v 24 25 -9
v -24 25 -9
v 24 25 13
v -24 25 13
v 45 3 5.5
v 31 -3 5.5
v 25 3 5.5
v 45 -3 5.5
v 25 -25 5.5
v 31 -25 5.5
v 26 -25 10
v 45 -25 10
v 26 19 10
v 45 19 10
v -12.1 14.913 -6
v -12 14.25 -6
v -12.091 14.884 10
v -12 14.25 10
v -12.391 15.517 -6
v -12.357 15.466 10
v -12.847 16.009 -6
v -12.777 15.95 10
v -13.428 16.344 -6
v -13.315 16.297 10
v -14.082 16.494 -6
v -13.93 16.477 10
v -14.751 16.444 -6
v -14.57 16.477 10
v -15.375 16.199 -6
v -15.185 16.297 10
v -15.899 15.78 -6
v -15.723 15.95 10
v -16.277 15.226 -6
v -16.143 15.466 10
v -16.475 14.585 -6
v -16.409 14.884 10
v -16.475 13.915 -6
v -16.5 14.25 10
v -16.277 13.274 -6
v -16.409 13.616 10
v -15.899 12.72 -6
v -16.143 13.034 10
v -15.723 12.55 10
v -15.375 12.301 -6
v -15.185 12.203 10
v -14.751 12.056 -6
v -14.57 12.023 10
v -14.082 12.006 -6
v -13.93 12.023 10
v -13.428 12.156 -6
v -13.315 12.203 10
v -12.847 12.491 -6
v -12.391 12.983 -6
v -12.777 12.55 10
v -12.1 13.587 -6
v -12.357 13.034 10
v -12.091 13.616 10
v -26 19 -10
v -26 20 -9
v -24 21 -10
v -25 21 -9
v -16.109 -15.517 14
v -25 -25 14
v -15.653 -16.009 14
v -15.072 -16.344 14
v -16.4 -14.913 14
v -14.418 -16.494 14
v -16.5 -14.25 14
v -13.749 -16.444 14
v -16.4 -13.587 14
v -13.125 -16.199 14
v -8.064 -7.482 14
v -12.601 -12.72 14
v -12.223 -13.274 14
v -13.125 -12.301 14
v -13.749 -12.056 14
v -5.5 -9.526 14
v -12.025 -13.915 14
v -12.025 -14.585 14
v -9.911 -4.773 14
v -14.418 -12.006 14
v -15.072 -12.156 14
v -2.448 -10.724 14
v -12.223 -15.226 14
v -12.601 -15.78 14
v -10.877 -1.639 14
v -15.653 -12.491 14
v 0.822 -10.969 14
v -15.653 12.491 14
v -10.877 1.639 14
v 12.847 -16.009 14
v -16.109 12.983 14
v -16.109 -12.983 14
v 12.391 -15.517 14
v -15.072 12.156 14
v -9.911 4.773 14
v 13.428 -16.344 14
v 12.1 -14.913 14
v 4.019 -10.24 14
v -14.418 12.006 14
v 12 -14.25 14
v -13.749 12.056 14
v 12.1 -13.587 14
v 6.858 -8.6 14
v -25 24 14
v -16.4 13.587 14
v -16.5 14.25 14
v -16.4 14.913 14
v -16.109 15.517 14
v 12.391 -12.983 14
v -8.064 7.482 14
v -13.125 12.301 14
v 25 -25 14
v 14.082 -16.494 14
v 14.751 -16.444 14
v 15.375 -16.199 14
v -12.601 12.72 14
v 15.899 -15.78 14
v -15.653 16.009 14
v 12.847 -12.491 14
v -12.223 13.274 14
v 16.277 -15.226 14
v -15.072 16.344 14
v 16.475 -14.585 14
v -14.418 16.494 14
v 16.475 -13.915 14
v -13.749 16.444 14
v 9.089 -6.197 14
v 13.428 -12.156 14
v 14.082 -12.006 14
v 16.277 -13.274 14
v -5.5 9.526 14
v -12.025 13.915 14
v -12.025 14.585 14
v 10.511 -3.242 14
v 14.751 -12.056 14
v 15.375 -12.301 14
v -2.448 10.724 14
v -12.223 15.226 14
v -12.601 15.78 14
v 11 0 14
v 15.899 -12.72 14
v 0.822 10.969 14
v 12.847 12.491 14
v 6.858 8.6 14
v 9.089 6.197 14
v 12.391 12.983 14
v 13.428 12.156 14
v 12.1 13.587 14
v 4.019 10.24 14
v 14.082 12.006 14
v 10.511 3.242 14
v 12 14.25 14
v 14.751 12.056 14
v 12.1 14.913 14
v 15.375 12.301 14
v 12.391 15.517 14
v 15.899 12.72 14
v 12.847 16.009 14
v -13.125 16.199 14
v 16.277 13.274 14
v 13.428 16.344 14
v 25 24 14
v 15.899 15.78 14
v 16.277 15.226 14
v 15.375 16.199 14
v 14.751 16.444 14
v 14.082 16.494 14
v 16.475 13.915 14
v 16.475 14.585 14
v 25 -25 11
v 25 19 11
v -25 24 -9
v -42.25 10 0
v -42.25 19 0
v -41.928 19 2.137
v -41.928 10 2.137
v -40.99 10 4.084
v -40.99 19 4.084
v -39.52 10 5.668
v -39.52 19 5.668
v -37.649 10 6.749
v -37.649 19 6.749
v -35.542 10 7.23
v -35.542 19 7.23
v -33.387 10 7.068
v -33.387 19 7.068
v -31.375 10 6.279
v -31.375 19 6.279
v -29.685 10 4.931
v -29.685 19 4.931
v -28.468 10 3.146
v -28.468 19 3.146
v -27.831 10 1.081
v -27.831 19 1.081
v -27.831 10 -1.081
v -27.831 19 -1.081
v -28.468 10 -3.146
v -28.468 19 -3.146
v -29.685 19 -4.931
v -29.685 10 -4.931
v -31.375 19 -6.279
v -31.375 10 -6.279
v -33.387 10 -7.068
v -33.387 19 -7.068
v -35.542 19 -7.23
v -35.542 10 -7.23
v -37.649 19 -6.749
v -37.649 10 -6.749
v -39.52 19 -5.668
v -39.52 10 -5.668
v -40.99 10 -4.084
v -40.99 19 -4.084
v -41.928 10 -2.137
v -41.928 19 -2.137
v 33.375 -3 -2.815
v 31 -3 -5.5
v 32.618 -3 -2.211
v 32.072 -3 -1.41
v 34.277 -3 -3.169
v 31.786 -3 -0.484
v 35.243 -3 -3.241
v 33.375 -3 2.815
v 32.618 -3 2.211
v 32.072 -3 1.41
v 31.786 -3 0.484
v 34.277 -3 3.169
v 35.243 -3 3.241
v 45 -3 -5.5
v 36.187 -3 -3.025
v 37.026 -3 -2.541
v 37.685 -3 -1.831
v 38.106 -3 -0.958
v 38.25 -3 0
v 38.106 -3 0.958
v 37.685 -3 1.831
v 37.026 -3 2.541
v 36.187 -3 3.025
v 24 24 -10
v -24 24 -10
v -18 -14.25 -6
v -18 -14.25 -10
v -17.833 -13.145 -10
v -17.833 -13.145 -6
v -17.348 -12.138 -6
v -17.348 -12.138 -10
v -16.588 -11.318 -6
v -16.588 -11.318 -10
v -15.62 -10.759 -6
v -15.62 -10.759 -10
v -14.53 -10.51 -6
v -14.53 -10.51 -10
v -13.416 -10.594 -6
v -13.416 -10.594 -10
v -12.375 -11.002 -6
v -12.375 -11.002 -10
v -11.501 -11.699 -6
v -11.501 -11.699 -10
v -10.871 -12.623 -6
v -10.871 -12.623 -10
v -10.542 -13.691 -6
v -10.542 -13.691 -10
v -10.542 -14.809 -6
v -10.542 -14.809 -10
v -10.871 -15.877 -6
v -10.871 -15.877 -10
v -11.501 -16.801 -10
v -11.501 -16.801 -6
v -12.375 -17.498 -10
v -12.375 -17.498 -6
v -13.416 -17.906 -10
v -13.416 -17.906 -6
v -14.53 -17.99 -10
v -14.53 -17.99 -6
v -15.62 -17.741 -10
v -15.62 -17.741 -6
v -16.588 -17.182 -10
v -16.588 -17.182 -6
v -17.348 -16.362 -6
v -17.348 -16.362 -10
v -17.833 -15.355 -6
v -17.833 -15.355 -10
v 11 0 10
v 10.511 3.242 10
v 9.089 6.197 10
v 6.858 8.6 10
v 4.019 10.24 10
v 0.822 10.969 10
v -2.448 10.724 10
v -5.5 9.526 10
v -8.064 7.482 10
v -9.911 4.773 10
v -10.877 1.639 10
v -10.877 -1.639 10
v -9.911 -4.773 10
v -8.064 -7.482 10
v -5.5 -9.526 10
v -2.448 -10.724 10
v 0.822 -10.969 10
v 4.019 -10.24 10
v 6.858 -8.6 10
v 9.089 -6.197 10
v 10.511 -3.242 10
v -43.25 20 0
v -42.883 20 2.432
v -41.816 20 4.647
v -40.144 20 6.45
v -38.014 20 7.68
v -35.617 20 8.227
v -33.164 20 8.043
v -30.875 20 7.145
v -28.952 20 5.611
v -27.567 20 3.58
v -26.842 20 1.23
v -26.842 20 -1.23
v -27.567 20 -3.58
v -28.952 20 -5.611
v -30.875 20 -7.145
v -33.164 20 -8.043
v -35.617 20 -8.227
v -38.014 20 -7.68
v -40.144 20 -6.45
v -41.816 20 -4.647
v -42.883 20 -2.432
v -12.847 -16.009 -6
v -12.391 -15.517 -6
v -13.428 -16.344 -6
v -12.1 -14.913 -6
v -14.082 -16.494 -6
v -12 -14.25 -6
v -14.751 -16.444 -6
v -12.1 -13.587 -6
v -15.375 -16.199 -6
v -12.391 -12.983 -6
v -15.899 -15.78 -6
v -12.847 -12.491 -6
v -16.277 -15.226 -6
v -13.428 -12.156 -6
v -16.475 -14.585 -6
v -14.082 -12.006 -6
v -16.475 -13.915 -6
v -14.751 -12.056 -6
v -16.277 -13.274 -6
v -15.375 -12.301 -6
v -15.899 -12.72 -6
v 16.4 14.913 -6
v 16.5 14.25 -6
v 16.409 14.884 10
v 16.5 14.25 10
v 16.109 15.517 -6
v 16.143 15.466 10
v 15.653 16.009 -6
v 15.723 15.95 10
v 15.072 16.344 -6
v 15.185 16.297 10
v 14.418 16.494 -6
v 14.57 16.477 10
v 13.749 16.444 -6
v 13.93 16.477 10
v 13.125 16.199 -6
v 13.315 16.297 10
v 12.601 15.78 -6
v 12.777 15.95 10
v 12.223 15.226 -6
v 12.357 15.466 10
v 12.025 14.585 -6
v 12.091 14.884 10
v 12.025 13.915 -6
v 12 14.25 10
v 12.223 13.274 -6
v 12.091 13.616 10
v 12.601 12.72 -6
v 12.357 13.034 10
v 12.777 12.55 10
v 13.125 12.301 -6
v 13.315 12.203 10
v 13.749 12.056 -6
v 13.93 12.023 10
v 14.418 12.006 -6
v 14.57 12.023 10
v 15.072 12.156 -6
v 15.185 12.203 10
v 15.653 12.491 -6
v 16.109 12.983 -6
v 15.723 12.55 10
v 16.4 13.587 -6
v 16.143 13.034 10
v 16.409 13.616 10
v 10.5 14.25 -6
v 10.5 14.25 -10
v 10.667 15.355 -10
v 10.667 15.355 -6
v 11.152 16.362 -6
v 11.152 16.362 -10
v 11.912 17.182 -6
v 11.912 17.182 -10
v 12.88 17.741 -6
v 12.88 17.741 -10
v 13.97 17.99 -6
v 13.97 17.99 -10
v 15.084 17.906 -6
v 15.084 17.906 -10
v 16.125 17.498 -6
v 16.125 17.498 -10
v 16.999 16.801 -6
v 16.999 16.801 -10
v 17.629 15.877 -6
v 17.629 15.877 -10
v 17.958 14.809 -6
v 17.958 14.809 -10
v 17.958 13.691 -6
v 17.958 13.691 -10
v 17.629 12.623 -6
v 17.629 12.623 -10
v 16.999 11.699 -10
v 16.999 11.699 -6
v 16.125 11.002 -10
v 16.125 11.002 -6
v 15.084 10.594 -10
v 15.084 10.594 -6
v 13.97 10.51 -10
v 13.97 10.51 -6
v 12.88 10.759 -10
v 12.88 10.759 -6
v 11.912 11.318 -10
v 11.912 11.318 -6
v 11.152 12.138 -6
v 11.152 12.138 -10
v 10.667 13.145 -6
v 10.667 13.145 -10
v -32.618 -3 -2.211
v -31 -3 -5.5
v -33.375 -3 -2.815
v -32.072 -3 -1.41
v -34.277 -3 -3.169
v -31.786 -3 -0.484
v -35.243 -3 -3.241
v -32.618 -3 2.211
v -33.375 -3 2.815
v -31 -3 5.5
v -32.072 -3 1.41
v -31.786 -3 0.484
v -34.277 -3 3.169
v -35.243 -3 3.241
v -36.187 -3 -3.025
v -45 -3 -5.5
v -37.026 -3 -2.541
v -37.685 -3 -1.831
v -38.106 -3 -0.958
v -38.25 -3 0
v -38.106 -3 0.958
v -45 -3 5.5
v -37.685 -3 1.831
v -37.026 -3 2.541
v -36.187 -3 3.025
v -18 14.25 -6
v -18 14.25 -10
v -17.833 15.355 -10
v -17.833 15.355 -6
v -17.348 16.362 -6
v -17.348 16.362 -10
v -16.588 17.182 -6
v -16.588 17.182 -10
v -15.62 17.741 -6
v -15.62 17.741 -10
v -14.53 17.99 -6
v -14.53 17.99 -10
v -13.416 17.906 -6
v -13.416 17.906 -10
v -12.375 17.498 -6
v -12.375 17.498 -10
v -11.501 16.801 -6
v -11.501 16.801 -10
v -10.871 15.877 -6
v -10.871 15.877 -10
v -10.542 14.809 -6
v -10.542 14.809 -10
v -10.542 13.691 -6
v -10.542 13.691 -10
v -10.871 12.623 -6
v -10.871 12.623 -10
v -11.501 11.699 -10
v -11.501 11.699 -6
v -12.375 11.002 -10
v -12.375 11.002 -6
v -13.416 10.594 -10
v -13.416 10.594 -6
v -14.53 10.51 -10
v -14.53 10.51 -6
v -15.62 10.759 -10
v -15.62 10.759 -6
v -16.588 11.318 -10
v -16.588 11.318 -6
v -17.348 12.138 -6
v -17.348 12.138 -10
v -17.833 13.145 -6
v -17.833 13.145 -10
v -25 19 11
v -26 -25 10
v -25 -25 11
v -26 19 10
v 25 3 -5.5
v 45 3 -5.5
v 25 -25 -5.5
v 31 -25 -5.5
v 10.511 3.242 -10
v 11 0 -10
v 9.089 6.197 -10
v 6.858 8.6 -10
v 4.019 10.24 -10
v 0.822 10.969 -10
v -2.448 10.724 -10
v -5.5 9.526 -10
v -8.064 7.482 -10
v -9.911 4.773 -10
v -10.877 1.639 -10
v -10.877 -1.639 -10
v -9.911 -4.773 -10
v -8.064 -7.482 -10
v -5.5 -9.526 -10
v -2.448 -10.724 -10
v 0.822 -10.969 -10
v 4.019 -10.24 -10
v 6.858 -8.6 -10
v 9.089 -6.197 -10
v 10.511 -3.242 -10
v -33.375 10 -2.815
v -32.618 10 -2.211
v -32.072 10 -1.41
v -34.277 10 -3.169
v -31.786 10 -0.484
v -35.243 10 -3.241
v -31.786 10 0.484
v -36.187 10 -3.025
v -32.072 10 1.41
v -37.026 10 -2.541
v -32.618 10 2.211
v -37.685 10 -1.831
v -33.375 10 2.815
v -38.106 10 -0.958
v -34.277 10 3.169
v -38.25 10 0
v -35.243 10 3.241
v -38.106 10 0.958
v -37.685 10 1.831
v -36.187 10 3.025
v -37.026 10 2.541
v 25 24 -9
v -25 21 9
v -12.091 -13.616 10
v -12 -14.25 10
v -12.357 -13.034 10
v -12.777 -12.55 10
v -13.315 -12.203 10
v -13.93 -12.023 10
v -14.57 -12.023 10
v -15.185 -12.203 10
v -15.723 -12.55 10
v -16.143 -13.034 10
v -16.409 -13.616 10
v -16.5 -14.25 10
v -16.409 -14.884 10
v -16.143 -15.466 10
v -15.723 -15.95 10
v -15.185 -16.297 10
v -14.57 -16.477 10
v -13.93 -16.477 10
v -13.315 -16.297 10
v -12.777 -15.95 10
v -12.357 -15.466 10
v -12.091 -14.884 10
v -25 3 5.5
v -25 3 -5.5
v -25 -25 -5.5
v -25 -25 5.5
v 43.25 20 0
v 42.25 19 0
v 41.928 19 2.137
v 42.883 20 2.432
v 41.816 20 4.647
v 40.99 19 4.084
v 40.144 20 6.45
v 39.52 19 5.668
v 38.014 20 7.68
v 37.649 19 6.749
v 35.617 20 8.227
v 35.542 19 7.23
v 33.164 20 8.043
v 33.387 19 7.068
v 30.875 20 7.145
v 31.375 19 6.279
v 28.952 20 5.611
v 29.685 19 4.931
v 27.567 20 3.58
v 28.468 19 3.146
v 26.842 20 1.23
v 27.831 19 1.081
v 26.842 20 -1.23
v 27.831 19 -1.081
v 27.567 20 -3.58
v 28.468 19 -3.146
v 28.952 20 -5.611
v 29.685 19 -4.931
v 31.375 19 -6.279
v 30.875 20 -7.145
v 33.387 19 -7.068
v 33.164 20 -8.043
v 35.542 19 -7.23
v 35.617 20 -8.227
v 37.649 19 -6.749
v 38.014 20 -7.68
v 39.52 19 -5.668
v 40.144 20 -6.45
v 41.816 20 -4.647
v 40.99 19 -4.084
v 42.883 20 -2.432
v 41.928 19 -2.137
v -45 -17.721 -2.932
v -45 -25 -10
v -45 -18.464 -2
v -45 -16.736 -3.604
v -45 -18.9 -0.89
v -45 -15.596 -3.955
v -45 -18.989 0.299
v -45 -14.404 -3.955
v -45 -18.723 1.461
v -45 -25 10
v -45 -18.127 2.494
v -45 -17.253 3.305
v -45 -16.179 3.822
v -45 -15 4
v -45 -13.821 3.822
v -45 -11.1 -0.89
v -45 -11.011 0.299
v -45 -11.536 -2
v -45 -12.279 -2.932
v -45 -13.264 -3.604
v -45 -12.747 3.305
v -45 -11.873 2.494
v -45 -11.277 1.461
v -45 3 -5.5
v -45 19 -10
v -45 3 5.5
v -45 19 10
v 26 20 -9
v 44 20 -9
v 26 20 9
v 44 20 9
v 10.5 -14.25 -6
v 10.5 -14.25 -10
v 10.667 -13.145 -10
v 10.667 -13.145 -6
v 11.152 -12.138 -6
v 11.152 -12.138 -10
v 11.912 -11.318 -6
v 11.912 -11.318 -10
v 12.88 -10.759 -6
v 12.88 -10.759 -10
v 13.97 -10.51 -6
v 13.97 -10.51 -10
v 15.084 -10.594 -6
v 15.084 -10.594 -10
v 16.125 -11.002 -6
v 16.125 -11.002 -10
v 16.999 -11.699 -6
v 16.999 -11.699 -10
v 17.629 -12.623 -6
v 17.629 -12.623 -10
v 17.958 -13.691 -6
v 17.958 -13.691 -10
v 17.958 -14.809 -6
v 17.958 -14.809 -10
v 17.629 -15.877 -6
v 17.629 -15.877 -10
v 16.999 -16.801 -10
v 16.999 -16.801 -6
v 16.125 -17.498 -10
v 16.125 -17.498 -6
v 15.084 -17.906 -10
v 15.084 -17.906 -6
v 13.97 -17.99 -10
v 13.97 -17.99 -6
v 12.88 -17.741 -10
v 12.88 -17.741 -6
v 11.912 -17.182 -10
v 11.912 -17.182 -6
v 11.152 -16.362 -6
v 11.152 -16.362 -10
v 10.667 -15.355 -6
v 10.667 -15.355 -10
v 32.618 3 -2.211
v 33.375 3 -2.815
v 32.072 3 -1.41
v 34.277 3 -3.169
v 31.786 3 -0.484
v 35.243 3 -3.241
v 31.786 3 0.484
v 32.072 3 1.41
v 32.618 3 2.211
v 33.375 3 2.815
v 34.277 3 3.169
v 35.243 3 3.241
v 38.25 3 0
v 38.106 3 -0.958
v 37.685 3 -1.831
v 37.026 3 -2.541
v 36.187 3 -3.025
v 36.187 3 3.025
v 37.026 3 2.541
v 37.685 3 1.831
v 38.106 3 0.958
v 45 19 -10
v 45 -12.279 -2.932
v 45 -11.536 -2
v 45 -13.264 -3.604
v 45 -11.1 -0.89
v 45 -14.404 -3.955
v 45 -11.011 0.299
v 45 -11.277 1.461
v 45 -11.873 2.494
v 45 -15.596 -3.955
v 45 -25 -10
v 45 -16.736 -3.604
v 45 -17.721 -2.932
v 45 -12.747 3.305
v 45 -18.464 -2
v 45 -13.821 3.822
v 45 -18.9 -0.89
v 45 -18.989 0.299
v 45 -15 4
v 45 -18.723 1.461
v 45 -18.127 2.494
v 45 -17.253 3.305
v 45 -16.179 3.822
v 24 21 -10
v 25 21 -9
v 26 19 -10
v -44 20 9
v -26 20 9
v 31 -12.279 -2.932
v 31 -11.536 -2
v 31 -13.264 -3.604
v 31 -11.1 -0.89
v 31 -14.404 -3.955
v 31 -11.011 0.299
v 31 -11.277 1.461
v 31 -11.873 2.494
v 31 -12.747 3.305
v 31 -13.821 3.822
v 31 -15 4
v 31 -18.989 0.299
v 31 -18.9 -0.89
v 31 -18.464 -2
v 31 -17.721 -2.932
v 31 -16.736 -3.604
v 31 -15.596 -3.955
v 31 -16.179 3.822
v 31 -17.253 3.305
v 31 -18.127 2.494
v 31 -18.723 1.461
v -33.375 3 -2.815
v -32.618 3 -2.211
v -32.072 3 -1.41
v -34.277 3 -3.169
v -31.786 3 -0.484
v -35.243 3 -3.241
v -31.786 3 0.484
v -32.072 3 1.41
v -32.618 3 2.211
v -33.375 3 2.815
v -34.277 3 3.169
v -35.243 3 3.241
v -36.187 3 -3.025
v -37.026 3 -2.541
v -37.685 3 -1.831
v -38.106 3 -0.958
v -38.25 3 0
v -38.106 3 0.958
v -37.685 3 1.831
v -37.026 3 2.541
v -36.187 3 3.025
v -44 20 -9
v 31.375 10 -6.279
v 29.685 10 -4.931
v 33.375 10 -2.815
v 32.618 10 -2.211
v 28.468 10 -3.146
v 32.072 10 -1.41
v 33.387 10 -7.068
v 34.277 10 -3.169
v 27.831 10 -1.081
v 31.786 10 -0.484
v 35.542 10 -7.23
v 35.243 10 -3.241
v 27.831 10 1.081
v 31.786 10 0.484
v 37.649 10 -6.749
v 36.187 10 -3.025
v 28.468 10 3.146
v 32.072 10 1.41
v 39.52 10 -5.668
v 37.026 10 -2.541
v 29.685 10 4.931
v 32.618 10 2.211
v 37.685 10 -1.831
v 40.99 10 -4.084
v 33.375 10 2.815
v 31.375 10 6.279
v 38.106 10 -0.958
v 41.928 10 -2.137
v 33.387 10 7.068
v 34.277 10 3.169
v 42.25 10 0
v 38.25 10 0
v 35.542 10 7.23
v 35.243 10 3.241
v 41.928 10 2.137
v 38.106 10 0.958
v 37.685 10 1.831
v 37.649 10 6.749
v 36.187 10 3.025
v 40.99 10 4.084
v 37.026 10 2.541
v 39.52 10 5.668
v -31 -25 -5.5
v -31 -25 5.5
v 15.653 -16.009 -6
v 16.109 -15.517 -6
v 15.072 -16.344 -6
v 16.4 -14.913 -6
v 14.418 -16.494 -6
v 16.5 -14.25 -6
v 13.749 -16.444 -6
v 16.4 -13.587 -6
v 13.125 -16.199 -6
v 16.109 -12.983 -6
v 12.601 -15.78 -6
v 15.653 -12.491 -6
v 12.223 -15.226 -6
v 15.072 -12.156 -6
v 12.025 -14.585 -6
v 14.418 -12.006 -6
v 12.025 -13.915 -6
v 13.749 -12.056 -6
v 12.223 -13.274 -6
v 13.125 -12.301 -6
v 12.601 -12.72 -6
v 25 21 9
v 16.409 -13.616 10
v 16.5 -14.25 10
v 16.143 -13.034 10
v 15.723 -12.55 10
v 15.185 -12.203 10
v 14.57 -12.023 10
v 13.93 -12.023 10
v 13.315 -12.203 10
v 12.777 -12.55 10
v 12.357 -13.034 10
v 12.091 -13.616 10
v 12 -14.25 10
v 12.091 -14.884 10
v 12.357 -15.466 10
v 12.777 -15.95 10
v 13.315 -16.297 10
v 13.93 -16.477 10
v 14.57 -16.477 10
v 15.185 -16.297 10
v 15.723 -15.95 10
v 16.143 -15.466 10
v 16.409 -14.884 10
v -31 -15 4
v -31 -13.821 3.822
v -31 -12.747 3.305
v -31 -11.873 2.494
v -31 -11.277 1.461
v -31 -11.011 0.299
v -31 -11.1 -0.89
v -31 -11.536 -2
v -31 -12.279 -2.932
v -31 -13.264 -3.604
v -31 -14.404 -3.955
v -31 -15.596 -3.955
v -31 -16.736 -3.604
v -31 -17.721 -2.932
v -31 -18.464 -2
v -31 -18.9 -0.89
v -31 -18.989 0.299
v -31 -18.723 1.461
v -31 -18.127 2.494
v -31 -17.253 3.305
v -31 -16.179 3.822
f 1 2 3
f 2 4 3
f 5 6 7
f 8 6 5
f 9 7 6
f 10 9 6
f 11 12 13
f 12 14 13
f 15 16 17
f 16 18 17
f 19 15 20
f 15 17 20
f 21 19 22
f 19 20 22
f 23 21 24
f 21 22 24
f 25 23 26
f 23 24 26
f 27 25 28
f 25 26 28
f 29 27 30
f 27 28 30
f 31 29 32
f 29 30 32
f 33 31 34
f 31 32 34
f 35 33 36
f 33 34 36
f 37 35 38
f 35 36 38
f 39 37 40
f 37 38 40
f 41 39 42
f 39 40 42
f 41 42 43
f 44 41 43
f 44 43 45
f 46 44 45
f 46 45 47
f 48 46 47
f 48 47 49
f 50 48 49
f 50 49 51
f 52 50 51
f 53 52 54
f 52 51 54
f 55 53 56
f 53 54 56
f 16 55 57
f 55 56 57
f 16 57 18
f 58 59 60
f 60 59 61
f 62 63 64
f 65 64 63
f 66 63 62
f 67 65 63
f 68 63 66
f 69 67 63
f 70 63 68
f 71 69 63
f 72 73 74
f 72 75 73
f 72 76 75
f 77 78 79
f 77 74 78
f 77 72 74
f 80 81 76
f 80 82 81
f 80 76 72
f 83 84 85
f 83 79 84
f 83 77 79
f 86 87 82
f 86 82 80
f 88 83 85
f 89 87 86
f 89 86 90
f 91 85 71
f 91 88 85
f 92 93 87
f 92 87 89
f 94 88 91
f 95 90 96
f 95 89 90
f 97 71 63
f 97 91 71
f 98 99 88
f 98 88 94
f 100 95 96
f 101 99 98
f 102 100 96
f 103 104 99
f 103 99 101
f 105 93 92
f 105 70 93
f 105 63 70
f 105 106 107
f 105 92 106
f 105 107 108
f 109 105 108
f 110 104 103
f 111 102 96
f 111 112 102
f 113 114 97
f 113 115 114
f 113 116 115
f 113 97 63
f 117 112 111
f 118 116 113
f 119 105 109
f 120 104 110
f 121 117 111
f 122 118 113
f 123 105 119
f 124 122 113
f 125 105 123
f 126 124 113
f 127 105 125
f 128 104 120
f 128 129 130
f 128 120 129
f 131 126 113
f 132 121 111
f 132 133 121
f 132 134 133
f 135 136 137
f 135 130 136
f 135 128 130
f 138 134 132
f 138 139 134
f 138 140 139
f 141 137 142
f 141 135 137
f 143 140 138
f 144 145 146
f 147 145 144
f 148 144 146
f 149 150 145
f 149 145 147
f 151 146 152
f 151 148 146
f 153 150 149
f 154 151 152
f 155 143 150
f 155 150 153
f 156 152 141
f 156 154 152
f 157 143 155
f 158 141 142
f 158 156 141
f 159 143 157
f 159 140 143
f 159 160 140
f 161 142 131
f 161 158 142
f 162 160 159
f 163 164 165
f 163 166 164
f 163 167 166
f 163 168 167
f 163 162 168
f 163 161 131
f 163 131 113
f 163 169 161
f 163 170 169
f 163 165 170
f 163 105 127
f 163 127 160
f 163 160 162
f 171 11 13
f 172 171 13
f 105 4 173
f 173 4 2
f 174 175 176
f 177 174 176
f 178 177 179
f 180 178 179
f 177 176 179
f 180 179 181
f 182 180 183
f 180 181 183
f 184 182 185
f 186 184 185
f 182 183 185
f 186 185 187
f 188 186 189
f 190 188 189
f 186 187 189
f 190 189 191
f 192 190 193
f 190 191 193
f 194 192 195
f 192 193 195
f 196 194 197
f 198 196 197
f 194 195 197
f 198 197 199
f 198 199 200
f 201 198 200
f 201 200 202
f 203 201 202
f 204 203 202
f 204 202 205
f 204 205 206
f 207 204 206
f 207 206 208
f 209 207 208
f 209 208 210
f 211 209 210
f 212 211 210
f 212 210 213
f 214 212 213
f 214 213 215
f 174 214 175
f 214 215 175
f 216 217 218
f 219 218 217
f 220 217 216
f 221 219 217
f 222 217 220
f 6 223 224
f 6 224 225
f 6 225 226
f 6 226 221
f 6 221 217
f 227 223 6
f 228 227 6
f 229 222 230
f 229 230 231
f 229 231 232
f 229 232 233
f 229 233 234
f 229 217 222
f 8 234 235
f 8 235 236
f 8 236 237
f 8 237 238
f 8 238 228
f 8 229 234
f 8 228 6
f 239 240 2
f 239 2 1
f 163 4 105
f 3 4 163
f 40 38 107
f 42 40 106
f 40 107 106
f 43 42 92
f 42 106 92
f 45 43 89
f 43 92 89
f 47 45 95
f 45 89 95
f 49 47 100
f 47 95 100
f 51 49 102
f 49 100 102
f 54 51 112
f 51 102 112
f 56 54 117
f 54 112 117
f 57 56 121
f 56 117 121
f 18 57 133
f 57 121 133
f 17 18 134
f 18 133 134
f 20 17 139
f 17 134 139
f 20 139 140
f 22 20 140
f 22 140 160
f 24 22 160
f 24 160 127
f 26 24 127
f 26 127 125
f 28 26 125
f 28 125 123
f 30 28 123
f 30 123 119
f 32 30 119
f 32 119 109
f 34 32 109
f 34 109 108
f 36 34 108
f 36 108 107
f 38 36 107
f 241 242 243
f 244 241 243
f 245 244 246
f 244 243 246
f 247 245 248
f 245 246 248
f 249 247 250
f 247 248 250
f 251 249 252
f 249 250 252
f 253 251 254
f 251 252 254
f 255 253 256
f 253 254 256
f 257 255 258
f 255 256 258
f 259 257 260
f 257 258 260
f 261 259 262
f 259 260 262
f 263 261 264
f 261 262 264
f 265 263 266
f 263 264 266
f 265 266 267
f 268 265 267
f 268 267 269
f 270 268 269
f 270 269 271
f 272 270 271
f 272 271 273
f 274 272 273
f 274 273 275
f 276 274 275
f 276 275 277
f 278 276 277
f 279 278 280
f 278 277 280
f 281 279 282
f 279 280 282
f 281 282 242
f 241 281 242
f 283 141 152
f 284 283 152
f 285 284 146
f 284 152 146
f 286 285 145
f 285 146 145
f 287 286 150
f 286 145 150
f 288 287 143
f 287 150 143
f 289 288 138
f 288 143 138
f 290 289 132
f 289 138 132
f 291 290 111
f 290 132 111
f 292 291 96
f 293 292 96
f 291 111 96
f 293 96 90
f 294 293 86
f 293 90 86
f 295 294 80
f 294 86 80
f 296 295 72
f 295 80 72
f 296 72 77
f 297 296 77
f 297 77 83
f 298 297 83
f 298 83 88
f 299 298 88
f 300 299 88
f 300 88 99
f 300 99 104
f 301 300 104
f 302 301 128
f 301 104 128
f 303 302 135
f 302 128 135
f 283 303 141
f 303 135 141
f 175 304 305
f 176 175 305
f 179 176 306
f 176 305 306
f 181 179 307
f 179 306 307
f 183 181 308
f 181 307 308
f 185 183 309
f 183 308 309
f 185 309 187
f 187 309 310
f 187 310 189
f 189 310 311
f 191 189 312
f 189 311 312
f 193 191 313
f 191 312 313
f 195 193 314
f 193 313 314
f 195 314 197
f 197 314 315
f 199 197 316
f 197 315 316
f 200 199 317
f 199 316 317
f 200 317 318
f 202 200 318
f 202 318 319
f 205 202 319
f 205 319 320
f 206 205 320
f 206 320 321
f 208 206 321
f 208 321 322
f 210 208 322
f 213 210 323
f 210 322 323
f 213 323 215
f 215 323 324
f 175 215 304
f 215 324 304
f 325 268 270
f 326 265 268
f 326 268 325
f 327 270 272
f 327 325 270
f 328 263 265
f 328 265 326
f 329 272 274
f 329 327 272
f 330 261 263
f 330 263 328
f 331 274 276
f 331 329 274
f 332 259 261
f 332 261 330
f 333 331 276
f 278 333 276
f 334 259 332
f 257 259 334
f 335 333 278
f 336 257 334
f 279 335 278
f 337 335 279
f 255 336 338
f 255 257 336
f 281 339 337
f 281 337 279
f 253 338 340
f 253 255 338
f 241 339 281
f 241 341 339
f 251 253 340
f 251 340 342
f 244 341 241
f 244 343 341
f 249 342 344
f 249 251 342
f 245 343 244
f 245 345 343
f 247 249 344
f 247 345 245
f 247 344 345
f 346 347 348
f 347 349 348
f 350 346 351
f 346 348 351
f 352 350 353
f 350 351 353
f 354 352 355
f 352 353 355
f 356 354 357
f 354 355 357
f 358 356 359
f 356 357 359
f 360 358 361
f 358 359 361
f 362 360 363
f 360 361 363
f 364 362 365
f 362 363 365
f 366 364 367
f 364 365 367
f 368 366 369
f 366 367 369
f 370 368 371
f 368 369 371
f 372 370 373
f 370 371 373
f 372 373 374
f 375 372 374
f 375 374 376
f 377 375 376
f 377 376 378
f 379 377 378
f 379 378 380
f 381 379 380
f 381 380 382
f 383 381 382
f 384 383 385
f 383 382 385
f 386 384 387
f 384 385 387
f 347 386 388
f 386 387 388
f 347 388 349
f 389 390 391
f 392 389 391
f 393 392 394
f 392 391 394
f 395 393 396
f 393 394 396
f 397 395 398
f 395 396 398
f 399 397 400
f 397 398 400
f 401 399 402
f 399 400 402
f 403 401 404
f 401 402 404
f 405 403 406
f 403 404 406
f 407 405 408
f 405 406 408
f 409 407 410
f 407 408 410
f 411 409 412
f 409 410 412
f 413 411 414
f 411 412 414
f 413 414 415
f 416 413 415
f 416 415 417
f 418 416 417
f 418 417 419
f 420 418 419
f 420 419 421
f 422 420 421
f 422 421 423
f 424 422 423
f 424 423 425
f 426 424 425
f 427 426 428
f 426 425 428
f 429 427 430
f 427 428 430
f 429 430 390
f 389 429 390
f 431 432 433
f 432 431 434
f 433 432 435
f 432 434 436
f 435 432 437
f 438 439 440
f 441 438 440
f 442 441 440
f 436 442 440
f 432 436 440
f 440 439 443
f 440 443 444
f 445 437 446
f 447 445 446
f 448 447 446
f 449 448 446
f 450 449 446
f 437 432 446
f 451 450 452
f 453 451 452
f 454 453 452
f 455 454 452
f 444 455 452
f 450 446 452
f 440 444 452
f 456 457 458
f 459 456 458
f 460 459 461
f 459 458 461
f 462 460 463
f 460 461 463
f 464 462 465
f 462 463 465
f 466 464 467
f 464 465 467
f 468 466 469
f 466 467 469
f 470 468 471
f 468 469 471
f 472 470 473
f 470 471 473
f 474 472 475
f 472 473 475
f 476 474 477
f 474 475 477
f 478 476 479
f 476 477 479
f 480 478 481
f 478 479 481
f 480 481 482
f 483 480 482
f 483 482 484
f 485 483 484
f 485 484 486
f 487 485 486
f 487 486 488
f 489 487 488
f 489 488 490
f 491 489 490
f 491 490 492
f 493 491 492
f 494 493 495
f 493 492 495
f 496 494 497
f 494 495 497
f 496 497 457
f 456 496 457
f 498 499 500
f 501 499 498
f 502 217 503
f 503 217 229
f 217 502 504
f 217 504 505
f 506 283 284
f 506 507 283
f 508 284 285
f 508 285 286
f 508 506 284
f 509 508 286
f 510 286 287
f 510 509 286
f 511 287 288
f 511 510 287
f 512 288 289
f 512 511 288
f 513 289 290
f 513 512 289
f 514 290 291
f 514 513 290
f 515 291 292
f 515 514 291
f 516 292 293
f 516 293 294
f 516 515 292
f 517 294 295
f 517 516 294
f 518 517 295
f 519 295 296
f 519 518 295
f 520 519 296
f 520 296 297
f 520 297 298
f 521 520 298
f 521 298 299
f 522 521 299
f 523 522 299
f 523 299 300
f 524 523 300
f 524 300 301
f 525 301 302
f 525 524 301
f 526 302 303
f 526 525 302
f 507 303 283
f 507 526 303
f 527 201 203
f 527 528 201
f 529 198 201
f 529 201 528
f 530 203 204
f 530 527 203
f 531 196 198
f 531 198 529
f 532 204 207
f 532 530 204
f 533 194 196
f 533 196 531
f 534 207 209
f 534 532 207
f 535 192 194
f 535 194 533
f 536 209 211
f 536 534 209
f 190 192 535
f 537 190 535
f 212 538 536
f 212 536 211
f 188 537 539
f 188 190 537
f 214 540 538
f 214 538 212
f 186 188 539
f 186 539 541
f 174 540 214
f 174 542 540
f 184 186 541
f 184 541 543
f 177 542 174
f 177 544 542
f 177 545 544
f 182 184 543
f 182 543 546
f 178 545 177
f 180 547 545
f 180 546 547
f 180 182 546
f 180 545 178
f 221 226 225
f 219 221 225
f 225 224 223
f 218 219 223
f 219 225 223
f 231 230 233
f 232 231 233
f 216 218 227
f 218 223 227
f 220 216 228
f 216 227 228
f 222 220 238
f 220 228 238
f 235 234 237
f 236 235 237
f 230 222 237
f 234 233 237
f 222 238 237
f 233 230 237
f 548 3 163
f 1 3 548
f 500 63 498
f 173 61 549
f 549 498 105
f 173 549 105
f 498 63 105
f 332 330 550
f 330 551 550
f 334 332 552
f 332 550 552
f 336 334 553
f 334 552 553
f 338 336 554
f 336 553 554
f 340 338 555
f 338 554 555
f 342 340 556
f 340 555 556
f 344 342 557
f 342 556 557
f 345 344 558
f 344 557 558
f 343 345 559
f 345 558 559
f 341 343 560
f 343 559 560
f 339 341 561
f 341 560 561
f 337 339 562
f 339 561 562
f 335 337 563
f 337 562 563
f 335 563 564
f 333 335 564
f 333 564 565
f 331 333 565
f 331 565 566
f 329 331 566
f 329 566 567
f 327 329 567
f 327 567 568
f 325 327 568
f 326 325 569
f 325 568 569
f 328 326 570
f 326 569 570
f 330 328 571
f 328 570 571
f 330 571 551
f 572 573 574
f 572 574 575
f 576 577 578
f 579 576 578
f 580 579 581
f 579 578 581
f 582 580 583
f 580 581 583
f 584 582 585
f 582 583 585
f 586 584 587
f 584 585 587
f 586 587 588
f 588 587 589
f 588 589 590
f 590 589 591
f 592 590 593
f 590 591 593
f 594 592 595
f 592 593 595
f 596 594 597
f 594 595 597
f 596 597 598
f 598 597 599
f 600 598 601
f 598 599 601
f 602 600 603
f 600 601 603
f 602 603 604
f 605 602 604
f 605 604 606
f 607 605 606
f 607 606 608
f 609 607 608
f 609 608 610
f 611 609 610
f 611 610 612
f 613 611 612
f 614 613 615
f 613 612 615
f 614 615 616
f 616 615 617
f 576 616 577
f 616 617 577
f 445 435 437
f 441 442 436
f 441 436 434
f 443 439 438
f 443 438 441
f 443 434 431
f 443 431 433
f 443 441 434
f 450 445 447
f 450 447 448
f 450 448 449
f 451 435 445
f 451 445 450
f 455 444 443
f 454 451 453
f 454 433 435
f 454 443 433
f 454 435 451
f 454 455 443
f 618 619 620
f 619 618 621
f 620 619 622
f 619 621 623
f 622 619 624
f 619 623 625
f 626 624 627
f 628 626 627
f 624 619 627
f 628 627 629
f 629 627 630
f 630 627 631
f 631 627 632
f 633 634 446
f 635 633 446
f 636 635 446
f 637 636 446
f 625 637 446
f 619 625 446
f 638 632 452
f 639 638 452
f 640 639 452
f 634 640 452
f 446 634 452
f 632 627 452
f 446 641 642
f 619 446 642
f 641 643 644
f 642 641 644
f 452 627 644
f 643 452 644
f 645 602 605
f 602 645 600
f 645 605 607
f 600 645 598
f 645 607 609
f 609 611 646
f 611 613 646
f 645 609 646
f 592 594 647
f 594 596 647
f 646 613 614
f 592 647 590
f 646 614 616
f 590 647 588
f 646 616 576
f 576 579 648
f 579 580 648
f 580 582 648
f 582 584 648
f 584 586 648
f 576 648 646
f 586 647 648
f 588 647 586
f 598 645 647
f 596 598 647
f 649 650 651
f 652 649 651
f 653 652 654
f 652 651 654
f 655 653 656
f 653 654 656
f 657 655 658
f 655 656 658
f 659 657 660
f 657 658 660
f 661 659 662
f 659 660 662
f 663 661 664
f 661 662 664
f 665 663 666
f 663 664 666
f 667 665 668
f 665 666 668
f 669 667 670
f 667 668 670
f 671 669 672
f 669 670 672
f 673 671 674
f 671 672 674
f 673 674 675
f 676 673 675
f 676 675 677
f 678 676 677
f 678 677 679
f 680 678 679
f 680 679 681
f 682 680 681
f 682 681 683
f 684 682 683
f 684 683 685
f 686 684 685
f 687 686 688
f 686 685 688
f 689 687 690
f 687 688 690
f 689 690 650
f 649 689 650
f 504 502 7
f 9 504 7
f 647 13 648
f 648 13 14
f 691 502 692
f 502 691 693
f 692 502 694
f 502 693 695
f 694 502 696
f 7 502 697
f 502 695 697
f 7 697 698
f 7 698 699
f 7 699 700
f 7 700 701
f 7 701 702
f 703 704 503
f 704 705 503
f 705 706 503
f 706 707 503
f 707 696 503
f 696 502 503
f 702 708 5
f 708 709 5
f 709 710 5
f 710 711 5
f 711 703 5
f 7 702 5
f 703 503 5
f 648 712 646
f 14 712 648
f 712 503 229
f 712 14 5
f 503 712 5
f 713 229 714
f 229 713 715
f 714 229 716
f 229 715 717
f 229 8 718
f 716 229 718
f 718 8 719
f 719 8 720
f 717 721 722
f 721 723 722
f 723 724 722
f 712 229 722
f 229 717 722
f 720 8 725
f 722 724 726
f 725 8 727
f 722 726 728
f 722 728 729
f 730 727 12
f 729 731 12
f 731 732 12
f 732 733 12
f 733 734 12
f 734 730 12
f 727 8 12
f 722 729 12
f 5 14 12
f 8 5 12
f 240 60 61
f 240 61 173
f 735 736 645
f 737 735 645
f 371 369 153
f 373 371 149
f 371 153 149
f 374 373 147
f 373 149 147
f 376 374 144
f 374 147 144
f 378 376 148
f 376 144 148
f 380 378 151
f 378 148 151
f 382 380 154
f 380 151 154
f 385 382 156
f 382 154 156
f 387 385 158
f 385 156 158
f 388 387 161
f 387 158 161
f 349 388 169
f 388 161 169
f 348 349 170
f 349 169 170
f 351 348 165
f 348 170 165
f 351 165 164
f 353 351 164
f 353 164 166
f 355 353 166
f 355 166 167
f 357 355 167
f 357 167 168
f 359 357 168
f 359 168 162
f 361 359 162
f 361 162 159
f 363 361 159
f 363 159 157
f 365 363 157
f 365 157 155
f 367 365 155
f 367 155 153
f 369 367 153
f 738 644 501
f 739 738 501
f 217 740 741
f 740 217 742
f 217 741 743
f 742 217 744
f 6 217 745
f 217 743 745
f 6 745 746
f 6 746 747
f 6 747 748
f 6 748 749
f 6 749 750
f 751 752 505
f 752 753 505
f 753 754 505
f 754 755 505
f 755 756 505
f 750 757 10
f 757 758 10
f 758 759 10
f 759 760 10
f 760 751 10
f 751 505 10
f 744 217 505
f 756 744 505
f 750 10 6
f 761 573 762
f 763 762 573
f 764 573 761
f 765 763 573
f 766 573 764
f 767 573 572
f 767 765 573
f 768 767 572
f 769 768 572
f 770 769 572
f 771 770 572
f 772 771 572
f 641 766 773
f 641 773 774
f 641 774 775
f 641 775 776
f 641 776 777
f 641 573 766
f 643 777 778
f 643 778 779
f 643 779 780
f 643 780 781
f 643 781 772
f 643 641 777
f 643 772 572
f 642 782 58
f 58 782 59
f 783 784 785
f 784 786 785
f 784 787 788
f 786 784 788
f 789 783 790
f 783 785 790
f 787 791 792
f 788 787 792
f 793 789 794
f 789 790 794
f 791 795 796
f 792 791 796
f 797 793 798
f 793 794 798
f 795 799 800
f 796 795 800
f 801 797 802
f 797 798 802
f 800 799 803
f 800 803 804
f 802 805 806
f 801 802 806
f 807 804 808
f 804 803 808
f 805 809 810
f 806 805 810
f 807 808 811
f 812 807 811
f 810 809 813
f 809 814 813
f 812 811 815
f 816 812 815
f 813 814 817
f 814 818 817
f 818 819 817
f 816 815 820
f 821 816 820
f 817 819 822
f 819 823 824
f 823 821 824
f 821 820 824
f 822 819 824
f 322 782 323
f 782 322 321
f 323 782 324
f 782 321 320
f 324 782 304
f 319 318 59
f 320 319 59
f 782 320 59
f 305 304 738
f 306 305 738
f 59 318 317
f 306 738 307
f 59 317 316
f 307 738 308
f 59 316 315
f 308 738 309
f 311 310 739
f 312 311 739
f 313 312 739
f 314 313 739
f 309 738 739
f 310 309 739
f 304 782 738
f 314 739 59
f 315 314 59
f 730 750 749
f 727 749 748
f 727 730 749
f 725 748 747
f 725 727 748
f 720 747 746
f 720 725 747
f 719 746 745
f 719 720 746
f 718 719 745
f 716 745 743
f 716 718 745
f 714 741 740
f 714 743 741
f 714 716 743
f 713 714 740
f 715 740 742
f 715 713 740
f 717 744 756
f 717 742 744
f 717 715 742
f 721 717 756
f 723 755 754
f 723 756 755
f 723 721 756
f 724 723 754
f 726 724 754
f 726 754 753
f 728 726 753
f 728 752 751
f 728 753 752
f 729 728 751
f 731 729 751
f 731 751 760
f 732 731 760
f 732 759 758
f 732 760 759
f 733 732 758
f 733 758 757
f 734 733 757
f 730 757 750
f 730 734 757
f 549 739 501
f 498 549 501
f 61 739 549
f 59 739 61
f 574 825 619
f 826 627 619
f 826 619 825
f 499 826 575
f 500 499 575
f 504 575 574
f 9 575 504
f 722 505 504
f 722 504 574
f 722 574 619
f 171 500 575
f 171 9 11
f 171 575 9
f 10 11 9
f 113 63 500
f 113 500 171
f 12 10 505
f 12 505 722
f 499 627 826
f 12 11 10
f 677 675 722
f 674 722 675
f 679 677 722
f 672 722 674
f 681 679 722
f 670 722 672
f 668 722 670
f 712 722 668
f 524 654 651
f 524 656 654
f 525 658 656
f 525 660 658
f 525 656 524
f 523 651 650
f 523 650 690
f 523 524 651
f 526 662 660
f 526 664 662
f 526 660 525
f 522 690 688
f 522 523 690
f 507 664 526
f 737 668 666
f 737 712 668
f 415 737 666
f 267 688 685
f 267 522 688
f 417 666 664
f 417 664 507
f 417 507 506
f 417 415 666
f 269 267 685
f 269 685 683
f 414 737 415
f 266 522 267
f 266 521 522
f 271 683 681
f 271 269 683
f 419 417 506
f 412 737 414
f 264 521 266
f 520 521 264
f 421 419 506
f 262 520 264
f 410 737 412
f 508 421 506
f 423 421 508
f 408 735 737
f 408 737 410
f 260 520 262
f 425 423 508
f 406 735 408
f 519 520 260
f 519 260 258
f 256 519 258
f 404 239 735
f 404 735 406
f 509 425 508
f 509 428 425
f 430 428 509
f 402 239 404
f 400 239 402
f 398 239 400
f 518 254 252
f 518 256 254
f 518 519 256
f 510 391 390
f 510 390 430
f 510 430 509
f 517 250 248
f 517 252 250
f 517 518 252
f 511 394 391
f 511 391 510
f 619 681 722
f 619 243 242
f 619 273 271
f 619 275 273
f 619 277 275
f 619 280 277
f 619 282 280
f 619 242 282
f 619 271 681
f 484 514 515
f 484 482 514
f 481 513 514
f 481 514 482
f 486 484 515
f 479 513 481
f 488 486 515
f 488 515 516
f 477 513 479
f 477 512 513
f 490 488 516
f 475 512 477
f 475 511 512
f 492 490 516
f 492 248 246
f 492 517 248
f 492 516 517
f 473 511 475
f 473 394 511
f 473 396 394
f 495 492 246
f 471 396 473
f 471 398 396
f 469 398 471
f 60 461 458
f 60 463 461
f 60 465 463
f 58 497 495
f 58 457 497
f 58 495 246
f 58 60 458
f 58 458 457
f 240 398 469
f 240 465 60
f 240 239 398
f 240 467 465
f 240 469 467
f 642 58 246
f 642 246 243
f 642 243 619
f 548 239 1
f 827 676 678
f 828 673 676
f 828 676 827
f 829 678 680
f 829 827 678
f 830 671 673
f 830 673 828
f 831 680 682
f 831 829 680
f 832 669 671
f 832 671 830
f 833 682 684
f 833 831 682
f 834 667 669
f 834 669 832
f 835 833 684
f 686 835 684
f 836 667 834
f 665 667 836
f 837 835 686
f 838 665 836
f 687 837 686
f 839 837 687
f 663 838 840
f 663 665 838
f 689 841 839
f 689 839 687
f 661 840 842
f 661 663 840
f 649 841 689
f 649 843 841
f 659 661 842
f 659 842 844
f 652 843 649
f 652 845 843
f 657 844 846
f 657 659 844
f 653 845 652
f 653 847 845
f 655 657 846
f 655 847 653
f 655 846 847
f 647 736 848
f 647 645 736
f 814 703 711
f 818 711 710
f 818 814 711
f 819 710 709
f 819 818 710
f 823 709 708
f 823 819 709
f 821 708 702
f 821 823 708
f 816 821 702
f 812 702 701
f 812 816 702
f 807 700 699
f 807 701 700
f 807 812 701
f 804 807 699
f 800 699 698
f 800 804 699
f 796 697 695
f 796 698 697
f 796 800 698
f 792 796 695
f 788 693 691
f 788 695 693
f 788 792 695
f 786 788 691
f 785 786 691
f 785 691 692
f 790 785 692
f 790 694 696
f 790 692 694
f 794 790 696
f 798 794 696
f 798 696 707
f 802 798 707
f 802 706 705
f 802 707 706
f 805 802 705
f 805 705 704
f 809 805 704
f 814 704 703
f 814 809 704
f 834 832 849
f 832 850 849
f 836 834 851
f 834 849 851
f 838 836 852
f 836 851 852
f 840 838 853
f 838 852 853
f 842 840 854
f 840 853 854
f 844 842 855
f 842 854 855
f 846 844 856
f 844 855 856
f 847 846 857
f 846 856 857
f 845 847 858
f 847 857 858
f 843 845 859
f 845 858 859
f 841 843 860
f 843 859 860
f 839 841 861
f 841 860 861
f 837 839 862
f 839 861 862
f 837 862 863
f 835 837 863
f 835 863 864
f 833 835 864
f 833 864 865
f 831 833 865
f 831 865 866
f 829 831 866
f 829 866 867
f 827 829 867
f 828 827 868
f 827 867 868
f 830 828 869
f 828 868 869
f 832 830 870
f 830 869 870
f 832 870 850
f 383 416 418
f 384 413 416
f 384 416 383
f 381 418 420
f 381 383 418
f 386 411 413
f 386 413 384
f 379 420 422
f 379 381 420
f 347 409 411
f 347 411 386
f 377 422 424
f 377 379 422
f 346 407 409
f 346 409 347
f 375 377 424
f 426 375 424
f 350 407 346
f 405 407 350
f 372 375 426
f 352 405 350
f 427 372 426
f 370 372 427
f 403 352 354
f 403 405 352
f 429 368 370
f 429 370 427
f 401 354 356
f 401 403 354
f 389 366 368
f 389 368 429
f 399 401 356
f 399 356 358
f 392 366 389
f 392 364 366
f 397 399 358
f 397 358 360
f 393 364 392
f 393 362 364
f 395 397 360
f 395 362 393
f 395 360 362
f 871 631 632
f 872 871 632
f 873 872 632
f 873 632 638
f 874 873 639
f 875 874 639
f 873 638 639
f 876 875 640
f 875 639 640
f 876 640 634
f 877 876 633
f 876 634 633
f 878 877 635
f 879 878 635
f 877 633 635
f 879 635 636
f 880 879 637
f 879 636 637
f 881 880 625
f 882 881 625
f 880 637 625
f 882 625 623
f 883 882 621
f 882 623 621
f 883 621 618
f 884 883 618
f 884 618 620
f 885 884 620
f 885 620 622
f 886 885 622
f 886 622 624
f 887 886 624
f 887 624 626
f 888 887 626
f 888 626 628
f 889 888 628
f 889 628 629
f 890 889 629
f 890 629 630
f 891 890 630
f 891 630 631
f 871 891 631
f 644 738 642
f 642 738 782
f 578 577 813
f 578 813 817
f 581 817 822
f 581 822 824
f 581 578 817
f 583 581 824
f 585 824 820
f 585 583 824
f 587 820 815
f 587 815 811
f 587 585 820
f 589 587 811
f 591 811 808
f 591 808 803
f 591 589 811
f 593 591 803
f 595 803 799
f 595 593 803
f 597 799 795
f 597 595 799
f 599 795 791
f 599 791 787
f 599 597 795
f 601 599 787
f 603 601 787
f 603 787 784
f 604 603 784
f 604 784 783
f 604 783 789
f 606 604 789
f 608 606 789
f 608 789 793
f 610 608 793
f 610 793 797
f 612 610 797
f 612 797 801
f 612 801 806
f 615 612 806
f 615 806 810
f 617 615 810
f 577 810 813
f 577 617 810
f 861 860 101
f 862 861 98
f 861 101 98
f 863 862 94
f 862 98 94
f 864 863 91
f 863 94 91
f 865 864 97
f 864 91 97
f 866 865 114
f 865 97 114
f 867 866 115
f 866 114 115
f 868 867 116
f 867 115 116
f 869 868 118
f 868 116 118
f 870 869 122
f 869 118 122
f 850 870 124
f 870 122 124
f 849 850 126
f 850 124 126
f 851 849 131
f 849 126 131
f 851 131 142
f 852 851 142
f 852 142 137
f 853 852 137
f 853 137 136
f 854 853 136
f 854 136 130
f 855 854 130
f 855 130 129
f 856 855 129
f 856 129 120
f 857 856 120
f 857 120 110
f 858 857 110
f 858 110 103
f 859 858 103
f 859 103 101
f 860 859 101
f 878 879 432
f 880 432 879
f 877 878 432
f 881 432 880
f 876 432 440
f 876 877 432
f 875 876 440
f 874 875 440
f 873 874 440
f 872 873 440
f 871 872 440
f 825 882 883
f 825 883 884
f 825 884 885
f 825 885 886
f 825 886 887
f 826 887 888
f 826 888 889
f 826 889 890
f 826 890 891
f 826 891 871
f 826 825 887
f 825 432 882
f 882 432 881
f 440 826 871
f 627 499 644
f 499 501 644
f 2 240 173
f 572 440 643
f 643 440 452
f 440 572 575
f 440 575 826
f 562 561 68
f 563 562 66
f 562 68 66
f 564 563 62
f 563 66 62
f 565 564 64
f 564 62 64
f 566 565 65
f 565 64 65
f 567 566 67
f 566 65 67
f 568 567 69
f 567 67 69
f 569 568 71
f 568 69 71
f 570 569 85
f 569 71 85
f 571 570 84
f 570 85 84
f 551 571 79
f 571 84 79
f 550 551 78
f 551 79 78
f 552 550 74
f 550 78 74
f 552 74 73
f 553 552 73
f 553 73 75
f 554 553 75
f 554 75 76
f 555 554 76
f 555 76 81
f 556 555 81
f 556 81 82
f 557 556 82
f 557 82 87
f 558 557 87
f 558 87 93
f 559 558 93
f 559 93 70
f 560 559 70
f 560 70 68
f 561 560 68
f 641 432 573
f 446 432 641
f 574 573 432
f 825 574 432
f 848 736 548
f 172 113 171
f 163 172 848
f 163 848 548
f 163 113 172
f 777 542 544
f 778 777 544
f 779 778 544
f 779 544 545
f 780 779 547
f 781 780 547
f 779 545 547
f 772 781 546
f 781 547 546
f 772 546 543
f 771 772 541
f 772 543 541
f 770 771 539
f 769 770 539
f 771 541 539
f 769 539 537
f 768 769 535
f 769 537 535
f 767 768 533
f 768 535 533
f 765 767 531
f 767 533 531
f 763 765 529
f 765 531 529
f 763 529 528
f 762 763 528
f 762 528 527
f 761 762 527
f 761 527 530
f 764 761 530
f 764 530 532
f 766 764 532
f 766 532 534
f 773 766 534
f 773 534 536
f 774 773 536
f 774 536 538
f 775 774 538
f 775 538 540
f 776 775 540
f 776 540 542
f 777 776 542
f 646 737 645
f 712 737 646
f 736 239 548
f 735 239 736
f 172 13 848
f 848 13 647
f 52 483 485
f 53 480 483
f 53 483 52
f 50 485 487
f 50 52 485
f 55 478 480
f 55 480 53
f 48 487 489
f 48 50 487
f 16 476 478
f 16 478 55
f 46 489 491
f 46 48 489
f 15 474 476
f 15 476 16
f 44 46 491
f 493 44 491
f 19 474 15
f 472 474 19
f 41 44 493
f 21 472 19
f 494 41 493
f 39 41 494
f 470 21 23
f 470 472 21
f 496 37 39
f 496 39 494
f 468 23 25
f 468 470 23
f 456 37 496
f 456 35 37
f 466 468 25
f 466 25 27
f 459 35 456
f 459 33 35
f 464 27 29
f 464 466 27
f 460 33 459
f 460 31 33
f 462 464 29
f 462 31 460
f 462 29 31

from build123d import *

# Parameters (mm, degrees)
SKETCH1_R              = 11
BODY_DEPTH             = 10
M4_CLEARANCE_HOLE1_D   = 4.5
ELEVATION_START        = 4
SKETCH10_W             = 50
SKETCH10_H             = 50
SKETCH10_R             = 2.25
SKETCH10_R_2           = 11
ELEVATION_DEPTH        = 4
SKETCH13_R             = 3.75
M4_SCREW_PLACE_DEPTH   = 4
SKETCH14_R             = 7.25
SPRING_HOLE_DEPTH      = 10
SKETCH15_W             = 11
SKETCH15_H             = 6
NUT_HOLE_DEPTH         = 20
SKETCH16_R             = 3.25
SHAFT_HOLE_DEPTH       = 13
SKETCH17_R             = 4
BRAKE_SCREW_HOLE_DEPTH = 20
SKETCH18_W             = 6
SKETCH18_H             = 11
BRAKE_NUT_HOLE_DEPTH   = 25
CHAMFER1_SIZE          = 1


with BuildPart() as part:
    # Sketch1 → Body (new, symmetric)
    with BuildSketch(Plane.XY):
        Polygon((25, -25), (-25, -25), (-45, -25), (-45, 20), (-25, 20), (-25, 25), (25, 25), (25, 20), (45, 20), (45, -25), align=None)
        Circle(SKETCH1_R, mode=Mode.SUBTRACT)
    extrude(amount=BODY_DEPTH, both=True)

    # M4 Clearance Hole1 (through all)
    with Locations(Plane(origin=(0, 0, -10), x_dir=(-1, 0, 0), z_dir=(0, 0, -1))):
        with Locations((0, 0), (-14.25, 14.25), (14.25, -14.25), (14.25, 14.25), (-14.25, -14.25)):
            Hole(M4_CLEARANCE_HOLE1_D / 2)

    # Sketch10 → Elevation (add)
    with BuildSketch(Plane.XY.offset(10).offset(ELEVATION_START)):
        Rectangle(SKETCH10_W, SKETCH10_H)
        with Locations(Location((-14.25, -14.25, 0), (0, 0, 180))):
            Circle(SKETCH10_R, mode=Mode.SUBTRACT)
        with Locations(Location((14.25, -14.25, 0), (0, 0, 180))):
            Circle(SKETCH10_R, mode=Mode.SUBTRACT)
        with Locations(Location((14.25, 14.25, 0), (0, 0, 180))):
            Circle(SKETCH10_R, mode=Mode.SUBTRACT)
        Circle(SKETCH10_R_2, mode=Mode.SUBTRACT)
        with Locations(Location((-14.25, 14.25, 0), (0, 0, 180))):
            Circle(SKETCH10_R, mode=Mode.SUBTRACT)
    extrude(amount=-ELEVATION_DEPTH)

    # Sketch13 → M4_Screw_Place (cut)
    with BuildSketch(Plane(origin=(0, 0, -10), x_dir=(-1, 0, 0), z_dir=(0, 0, -1))):
        with Locations((-14.25, 14.25)):
            Circle(SKETCH13_R)
        with Locations((14.25, 14.25)):
            Circle(SKETCH13_R)
        with Locations((14.25, -14.25)):
            Circle(SKETCH13_R)
        with Locations((-14.25, -14.25)):
            Circle(SKETCH13_R)
    extrude(amount=-M4_SCREW_PLACE_DEPTH, mode=Mode.SUBTRACT)

    # Sketch14 → Spring_Hole (cut)
    with BuildSketch(Plane(origin=(0, 20, 0), x_dir=(1, 0, 0), z_dir=(0, 1, 0))):
        with Locations(Location((-35, 0, 0), (0, 0, 180))):
            Circle(SKETCH14_R)
    spring_hole = extrude(amount=-SPRING_HOLE_DEPTH, mode=Mode.SUBTRACT)

    # Sketch15 → Nut_Hole (cut)
    with BuildSketch(Plane.ZY.offset(45)):
        Rectangle(SKETCH15_W, SKETCH15_H)
    nut_hole = extrude(amount=-NUT_HOLE_DEPTH, mode=Mode.SUBTRACT)

    # Sketch16 → Shaft_Hole (cut)
    with BuildSketch(Plane(origin=(0, 10, 0), x_dir=(1, 0, 0), z_dir=(0, 1, 0))):
        with Locations(Location((-35, 0, 0), (0, 0, 180))):
            Circle(SKETCH16_R)
    shaft_hole = extrude(amount=-SHAFT_HOLE_DEPTH, mode=Mode.SUBTRACT)

    # Sketch17 → Brake_Screw_Hole (cut)
    with BuildSketch(Plane.ZY.offset(45)):
        with Locations((0, -15)):
            Circle(SKETCH17_R)
    brake_screw_hole = extrude(amount=-BRAKE_SCREW_HOLE_DEPTH, mode=Mode.SUBTRACT)

    # Sketch18 → Brake_Nut_Hole (cut)
    with BuildSketch(Plane.XZ.offset(25)):
        with Locations((28, 0)):
            Rectangle(SKETCH18_W, SKETCH18_H)
    brake_nut_hole = extrude(amount=-BRAKE_NUT_HOLE_DEPTH, mode=Mode.SUBTRACT)

    # Mirror1: Spring_Hole, Nut_Hole, Shaft_Hole, Brake_Screw_Hole, Brake_Nut_Hole across plane
    add(spring_hole.mirror(Plane(origin=(0, 0, 0), x_dir=(0, 0, 1), z_dir=(1, 0, 0))), mode=Mode.SUBTRACT)
    add(nut_hole.mirror(Plane(origin=(0, 0, 0), x_dir=(0, 0, 1), z_dir=(1, 0, 0))), mode=Mode.SUBTRACT)
    add(shaft_hole.mirror(Plane(origin=(0, 0, 0), x_dir=(0, 0, 1), z_dir=(1, 0, 0))), mode=Mode.SUBTRACT)
    add(brake_screw_hole.mirror(Plane(origin=(0, 0, 0), x_dir=(0, 0, 1), z_dir=(1, 0, 0))), mode=Mode.SUBTRACT)
    add(brake_nut_hole.mirror(Plane(origin=(0, 0, 0), x_dir=(0, 0, 1), z_dir=(1, 0, 0))), mode=Mode.SUBTRACT)

    # Chamfer1
    chamfer1_edges = [part.edges().sort_by_distance(p)[0] for p in [
        (25, 22.5, -10),
        (35, 20, -10),
        (-27.75, 20, 0),
        (-35, 20, 10),
        (-35, 20, -10),
        (-25, 22.5, -10),
        (0, 25, -10),
        (27.75, 20, 0),
        (25, 25, 2),
        (25, 20, 0),
        (45, 20, 0),
        (-45, 20, 0),
        (-25, 20, 0),
        (-25, 25, 2),
        (35, 20, 10),
        (-25, -2.5, 10),
        (0, 25, 14),
        (25, -2.5, 10),
    ]]
    chamfer(chamfer1_edges, length=CHAMFER1_SIZE)


solid = part.part
